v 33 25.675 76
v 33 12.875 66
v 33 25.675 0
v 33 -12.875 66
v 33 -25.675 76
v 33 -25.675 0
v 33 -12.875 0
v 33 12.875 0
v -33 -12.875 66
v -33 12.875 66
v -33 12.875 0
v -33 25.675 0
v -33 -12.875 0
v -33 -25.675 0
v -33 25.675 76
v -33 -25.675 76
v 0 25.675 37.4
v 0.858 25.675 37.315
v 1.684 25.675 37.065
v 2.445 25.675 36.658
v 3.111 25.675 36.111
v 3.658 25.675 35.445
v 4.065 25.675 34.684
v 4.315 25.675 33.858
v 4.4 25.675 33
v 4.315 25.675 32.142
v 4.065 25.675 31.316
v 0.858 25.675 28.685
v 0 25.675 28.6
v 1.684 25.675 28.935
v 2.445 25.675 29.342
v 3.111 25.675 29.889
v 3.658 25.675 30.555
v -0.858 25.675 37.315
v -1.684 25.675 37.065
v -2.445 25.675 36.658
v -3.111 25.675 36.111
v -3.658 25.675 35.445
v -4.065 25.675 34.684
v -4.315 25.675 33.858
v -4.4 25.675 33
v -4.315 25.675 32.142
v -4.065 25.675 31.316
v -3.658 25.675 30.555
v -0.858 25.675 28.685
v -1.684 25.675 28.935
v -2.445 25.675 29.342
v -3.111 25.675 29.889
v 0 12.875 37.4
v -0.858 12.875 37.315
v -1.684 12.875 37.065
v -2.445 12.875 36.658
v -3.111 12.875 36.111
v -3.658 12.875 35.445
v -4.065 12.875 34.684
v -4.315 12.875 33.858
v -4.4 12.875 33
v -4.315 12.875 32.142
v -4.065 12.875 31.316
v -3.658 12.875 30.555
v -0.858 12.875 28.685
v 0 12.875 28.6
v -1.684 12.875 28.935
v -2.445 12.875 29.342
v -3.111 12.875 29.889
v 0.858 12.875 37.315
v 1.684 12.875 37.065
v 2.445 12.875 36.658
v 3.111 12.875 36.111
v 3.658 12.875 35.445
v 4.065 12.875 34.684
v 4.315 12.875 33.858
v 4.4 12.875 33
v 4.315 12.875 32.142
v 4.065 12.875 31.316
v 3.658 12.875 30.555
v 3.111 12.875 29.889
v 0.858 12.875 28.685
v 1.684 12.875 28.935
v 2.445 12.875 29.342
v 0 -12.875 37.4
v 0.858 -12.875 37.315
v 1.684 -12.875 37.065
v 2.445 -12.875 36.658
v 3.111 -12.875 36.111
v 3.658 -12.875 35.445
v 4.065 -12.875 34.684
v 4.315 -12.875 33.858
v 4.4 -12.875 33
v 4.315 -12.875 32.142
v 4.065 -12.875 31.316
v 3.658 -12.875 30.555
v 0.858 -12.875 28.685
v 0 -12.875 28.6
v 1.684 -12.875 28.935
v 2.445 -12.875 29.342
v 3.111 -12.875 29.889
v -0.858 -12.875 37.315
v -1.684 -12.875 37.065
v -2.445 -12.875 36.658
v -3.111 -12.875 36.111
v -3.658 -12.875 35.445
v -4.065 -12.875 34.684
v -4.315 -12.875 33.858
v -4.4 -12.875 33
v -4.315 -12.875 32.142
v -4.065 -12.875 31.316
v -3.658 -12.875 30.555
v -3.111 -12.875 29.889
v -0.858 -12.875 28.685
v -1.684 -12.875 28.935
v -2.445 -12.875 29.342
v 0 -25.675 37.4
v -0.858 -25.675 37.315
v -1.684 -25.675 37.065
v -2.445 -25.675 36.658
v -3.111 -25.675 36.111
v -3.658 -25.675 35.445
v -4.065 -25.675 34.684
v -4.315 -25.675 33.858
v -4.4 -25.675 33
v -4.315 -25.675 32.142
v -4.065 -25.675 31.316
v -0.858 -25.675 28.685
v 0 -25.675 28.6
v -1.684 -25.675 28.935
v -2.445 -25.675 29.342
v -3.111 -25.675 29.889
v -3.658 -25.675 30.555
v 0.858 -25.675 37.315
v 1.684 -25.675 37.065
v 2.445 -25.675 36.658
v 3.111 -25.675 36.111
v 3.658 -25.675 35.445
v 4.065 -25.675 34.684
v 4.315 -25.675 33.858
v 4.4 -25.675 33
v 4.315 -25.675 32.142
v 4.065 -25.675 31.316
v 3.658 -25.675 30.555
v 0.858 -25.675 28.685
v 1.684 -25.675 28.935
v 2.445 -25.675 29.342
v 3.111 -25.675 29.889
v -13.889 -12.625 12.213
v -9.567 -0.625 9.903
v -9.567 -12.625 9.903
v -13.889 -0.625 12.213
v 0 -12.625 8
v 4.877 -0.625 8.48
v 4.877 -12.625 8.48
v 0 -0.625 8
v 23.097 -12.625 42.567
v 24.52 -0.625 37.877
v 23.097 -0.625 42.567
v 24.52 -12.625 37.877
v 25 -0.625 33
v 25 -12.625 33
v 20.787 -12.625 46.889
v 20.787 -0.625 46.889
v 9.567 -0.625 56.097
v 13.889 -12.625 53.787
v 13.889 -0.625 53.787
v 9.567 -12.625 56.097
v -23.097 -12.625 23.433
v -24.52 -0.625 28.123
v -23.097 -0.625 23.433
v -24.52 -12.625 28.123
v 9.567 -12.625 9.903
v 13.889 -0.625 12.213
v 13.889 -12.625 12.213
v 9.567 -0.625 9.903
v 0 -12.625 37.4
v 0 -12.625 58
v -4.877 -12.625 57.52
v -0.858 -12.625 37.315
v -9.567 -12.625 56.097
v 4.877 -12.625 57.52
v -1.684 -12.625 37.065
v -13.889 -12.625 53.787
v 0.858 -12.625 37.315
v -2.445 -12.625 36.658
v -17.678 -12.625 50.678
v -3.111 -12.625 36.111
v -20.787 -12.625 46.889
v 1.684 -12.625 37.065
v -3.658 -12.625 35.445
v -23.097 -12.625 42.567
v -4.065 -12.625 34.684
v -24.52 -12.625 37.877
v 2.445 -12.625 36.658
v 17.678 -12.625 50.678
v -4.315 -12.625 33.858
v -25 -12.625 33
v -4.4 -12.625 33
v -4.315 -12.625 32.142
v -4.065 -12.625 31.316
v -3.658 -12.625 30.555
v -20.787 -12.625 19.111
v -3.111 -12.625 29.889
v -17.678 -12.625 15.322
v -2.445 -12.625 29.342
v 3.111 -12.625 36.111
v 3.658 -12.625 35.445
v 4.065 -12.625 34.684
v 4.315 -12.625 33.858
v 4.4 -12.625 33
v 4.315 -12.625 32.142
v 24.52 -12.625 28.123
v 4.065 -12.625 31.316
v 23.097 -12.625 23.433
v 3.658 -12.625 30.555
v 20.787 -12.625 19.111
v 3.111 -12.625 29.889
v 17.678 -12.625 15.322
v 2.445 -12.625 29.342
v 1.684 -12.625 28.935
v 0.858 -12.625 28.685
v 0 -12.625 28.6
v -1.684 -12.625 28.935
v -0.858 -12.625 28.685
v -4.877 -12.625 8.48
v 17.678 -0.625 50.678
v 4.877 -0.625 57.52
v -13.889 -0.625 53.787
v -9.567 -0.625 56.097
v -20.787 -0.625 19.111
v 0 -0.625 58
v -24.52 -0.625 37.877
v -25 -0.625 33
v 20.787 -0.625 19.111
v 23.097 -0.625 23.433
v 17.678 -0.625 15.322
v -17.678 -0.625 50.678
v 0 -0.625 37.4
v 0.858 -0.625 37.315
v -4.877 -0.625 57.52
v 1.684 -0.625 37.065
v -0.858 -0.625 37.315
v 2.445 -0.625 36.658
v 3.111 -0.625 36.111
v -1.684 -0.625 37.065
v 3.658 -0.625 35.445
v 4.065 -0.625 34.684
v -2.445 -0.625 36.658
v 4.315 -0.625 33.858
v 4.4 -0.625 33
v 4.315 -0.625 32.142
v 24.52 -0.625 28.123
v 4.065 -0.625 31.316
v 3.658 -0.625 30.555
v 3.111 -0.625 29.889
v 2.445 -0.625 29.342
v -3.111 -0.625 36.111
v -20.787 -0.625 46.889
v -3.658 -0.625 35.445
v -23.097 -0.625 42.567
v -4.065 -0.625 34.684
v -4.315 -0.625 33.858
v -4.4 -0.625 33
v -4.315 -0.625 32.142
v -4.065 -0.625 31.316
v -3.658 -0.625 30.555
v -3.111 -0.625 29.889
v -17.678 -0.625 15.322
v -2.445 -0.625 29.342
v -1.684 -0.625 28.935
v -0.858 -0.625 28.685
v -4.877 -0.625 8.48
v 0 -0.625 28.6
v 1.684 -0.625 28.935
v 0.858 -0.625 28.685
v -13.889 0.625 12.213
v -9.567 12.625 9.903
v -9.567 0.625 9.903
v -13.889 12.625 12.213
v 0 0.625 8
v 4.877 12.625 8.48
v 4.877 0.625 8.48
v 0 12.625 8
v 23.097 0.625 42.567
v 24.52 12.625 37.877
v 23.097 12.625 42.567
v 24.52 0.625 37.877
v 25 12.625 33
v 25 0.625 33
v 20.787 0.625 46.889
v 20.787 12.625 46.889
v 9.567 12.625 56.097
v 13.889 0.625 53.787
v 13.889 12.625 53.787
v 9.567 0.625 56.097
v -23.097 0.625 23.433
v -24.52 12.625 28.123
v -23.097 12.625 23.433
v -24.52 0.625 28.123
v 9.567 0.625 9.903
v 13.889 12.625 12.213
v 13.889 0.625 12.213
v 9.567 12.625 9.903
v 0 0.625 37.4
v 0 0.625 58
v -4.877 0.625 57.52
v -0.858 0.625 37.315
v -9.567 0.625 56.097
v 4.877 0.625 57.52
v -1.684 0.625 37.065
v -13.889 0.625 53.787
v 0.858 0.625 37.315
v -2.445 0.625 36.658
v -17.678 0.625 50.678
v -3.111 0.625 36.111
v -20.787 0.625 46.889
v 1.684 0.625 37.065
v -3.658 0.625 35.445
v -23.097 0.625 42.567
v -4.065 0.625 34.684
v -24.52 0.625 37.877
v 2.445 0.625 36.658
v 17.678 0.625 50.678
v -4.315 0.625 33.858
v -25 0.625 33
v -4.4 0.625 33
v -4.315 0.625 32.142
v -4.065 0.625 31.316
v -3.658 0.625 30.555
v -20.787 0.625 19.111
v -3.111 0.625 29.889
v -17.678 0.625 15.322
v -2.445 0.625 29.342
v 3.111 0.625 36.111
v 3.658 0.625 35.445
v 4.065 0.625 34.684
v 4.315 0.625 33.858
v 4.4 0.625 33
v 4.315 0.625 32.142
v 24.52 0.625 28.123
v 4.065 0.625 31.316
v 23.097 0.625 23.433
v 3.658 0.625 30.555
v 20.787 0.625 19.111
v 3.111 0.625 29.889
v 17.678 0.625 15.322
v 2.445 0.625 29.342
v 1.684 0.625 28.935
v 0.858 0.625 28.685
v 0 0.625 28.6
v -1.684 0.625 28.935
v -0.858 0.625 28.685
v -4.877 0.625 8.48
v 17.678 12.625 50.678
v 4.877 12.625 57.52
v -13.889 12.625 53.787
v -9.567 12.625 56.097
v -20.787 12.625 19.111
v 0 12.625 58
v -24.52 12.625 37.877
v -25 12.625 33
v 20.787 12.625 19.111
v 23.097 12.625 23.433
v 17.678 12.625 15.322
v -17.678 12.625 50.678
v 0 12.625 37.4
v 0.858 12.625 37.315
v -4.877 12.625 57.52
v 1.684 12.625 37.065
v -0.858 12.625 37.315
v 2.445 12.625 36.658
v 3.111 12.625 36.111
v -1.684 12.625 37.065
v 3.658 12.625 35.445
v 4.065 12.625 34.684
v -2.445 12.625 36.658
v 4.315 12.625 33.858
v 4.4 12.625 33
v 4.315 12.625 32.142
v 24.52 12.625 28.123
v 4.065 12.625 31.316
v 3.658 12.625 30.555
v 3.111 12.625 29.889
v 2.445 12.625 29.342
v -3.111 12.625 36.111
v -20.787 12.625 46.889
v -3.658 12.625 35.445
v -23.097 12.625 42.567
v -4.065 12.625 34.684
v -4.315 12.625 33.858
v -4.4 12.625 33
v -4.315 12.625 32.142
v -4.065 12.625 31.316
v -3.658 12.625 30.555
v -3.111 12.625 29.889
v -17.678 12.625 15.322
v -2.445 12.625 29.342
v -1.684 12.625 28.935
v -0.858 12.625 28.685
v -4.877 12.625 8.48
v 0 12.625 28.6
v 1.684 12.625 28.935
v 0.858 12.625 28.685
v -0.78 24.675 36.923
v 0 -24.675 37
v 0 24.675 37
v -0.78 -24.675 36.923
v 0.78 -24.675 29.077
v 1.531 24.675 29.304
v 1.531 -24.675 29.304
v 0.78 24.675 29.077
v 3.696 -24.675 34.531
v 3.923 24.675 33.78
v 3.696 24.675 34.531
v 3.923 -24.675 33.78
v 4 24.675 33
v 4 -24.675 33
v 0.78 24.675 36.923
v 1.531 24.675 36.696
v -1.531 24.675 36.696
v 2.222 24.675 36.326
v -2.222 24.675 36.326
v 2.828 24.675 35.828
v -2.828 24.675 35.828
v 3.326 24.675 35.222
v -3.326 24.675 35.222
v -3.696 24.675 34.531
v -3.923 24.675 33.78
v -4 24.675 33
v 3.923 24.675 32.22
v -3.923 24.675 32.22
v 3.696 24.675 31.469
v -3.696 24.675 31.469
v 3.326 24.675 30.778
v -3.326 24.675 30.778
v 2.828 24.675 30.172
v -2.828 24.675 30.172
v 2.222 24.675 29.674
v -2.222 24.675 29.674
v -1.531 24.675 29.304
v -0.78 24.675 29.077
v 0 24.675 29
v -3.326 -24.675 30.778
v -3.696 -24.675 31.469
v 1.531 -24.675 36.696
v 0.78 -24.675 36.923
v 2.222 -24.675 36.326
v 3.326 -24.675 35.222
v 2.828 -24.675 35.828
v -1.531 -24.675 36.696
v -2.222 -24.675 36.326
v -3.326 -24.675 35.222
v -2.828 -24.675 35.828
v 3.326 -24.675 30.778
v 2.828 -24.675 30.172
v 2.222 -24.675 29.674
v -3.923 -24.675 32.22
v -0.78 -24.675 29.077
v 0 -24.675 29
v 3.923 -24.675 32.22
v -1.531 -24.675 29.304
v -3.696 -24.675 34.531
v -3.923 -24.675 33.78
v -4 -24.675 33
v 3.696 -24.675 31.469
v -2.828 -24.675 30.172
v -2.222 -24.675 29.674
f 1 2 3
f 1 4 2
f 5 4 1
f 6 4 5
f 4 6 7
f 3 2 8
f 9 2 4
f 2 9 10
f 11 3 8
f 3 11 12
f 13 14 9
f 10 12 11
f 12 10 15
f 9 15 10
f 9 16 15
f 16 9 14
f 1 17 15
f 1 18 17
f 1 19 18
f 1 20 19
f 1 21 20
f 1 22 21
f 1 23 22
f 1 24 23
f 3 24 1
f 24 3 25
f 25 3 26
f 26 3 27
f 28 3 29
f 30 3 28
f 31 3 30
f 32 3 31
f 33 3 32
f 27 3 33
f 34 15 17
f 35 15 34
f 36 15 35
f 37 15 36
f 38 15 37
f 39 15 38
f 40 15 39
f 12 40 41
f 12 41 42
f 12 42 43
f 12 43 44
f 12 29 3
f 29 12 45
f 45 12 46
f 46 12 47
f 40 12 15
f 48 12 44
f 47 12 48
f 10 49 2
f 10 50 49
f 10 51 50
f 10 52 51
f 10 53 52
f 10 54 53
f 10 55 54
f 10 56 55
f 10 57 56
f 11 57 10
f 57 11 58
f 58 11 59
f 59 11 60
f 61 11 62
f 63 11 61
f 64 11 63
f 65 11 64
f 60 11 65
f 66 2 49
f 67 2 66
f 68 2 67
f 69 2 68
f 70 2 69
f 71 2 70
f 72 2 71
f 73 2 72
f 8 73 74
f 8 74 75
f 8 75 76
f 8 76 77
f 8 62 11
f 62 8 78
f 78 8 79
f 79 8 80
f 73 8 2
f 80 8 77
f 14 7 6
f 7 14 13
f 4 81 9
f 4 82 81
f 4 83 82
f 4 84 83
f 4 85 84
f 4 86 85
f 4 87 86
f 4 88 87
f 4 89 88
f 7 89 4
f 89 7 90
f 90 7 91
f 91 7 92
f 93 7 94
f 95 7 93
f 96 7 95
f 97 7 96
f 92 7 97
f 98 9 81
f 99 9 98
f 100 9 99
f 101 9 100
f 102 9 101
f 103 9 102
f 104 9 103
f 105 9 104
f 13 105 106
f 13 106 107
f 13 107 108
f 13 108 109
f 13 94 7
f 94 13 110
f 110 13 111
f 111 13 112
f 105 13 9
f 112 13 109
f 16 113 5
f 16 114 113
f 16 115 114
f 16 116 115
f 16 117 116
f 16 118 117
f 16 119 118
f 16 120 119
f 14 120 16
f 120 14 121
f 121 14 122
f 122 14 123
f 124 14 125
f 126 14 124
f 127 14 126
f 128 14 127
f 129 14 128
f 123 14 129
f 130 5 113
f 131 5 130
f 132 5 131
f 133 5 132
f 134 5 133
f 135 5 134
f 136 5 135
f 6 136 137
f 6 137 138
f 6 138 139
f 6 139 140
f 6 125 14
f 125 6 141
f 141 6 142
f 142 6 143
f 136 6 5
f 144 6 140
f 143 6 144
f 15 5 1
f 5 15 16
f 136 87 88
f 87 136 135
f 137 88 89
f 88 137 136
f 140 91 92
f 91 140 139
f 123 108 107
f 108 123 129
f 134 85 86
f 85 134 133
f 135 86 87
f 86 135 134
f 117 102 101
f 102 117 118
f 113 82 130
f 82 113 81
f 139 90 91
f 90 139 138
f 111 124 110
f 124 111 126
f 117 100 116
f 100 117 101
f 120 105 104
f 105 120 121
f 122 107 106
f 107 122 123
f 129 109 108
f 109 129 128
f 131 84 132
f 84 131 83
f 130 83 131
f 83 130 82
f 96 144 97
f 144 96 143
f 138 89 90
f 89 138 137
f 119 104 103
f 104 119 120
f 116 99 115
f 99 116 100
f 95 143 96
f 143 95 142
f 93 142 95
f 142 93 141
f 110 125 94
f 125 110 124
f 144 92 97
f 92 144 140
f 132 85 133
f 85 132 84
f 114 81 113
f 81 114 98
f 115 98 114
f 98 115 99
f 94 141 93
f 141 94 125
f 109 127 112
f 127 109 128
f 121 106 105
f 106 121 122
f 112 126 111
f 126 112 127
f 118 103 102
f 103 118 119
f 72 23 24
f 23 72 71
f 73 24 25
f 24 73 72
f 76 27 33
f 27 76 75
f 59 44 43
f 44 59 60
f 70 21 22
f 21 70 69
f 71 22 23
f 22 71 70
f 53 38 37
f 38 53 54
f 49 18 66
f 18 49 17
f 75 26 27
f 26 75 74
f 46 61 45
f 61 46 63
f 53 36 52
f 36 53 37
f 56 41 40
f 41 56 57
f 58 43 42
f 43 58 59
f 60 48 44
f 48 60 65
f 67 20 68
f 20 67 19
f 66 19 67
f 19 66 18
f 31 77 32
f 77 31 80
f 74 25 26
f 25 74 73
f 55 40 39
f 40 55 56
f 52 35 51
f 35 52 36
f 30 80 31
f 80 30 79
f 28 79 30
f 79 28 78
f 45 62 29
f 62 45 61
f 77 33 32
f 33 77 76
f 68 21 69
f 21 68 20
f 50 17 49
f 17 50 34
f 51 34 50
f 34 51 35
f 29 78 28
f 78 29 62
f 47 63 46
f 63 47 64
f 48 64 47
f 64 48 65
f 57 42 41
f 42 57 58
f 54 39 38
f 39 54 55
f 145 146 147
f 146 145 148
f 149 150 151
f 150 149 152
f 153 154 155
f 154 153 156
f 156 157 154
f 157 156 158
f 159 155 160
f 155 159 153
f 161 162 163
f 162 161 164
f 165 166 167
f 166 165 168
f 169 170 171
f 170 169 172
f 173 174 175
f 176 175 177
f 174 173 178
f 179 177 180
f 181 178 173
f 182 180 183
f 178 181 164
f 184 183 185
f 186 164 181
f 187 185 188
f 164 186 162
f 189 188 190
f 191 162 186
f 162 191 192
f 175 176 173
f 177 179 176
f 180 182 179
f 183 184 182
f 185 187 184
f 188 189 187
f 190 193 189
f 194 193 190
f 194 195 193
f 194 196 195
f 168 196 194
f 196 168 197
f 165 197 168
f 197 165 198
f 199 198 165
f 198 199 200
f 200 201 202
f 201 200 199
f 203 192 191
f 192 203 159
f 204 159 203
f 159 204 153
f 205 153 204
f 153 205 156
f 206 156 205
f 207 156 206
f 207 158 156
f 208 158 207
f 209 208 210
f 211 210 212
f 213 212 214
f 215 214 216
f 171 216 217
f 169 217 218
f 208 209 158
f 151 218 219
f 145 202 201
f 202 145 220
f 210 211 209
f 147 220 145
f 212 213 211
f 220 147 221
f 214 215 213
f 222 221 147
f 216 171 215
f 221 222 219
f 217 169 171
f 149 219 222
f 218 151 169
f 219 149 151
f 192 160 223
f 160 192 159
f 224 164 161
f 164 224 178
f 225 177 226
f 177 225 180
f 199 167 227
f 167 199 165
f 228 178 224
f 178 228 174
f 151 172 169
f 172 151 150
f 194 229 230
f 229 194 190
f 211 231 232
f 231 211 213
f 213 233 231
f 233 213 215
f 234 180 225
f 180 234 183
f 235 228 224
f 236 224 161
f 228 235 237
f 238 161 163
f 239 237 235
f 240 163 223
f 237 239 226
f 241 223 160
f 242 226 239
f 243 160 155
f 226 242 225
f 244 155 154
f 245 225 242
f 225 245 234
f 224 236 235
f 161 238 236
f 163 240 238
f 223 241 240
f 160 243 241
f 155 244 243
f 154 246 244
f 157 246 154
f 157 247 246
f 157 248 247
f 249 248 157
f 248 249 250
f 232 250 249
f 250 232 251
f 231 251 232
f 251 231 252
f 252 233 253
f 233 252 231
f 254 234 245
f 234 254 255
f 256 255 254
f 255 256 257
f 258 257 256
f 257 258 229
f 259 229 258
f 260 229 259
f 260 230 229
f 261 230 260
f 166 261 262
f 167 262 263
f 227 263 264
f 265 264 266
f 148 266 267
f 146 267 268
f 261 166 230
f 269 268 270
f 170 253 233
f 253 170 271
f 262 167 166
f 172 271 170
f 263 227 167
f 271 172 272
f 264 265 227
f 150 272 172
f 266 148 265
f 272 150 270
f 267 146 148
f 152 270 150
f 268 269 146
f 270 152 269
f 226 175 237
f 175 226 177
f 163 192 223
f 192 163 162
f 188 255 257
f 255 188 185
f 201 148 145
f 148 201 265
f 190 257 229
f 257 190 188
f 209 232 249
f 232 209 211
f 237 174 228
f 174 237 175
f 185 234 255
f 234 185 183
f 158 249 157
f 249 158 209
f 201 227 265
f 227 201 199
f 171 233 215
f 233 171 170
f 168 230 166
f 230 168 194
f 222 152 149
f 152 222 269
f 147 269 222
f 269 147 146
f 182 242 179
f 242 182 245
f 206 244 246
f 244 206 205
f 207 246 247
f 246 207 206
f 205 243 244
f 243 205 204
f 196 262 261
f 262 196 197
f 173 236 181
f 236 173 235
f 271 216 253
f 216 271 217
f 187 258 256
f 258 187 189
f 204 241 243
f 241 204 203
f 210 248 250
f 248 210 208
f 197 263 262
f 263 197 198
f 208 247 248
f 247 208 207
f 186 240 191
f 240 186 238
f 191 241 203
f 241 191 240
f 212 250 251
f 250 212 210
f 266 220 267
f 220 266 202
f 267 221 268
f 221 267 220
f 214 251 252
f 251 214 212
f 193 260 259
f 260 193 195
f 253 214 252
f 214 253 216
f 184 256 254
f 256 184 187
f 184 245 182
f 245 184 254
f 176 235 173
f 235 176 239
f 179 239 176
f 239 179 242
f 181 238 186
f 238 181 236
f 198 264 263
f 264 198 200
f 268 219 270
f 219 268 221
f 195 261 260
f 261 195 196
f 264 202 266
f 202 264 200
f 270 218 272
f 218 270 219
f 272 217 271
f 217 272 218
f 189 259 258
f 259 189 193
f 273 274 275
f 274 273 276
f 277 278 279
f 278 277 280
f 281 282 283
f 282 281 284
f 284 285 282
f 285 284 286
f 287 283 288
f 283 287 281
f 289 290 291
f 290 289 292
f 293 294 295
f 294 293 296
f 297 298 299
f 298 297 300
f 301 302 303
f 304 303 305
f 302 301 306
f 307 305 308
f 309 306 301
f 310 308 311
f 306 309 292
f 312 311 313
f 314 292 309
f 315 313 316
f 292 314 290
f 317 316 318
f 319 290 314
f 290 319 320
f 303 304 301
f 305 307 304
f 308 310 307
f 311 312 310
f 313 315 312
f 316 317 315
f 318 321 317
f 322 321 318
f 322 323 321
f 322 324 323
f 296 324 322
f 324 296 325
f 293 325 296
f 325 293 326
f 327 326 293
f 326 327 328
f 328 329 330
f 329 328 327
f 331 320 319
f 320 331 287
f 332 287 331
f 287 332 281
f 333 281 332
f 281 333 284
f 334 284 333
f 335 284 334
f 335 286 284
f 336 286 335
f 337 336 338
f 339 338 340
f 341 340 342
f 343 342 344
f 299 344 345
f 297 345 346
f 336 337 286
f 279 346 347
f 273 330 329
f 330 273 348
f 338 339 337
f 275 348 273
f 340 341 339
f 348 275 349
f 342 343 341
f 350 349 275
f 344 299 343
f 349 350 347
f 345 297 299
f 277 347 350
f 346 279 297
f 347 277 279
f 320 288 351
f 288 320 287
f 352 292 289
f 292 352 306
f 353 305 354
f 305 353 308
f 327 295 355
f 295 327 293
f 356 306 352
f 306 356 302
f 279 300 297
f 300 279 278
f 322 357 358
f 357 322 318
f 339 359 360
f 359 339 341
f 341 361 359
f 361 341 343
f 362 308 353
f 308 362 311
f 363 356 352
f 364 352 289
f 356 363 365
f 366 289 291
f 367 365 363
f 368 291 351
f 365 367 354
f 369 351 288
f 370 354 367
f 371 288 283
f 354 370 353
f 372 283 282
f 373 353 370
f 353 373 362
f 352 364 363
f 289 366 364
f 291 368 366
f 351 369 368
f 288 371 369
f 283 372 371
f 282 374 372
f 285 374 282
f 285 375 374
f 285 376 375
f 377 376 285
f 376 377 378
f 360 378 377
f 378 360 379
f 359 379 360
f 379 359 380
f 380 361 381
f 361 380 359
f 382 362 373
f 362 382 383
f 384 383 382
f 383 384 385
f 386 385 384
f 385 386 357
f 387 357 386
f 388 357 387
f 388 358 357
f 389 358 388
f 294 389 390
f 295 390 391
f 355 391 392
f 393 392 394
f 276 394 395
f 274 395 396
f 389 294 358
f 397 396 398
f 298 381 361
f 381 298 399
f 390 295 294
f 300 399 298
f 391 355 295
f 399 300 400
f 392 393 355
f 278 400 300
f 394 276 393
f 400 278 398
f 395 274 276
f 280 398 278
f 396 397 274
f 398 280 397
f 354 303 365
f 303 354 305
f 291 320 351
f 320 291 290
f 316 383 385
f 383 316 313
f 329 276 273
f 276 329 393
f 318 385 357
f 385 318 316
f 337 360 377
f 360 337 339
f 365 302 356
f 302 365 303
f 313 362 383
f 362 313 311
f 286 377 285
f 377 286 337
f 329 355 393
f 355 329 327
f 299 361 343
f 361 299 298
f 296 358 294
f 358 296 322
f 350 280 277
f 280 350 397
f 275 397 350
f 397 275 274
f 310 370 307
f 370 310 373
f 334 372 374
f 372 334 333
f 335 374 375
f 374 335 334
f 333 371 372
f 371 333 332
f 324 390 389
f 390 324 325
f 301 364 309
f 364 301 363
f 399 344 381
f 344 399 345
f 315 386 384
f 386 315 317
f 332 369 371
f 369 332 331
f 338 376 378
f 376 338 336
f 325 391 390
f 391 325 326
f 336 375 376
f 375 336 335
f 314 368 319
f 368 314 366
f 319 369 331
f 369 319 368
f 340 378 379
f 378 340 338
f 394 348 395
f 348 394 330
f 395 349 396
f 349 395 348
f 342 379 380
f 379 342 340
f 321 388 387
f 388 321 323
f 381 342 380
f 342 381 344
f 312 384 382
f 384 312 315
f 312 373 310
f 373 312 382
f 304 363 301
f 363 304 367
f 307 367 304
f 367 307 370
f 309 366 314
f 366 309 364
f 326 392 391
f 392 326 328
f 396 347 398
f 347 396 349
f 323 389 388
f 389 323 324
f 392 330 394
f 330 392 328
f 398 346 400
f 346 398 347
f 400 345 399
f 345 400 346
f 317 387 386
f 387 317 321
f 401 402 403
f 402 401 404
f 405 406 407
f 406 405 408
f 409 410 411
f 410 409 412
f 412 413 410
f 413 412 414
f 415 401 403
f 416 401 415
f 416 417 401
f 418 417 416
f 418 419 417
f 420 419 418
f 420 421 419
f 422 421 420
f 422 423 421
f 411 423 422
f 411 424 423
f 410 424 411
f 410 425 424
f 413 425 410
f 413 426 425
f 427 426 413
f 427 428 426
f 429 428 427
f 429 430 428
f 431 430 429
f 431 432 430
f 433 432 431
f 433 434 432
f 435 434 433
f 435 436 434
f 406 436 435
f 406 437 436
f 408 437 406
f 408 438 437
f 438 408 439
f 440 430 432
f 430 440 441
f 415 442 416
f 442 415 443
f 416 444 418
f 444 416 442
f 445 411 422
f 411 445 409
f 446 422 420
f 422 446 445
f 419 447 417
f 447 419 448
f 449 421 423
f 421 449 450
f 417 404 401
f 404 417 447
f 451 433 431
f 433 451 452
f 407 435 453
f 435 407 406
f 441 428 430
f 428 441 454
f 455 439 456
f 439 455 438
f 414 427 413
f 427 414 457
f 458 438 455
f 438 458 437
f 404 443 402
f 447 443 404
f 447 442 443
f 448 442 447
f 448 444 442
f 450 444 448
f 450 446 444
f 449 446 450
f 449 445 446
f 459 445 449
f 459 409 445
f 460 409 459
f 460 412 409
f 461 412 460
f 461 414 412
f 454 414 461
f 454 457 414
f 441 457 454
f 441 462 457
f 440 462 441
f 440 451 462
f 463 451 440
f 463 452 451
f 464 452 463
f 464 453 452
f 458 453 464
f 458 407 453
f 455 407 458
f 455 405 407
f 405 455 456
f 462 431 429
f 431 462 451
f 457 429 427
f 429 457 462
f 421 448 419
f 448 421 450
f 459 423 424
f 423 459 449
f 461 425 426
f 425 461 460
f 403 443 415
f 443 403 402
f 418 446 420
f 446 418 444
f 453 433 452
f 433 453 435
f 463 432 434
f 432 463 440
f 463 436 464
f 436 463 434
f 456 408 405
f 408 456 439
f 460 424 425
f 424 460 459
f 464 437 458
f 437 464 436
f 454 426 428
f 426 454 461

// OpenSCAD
$fn = 32;

// ------------------------------------------------------------------------
// Trolley wheel set: wheels d50, fork 66 mm tall
// Every part is its own module, assembly() places every instance.
// ------------------------------------------------------------------------

// --- part 1 ---
module trolley_fork() {
  difference() {
    union() {
      translate([-33, 12.875, 0]) cube([66, 12.8, 66]);
      translate([-33, -25.675, 0]) cube([66, 12.8, 66]);
      translate([-33, -25.675, 66]) cube([66, 51.35, 10]);
    }
    translate([0, -19.275, 33]) rotate([90, 0, 0]) cylinder(h = 14.8, d = 8.8, center = true);
    translate([0, 19.275, 33]) rotate([90, 0, 0]) cylinder(h = 14.8, d = 8.8, center = true);
  }
}

// --- part 2 ---
module trolley_wheel() {
  difference() {
      translate([0, 0, 0]) cylinder(h = 12, d = 50);
      translate([0, 0, -1]) cylinder(h = 14, d = 8.8);
    }
}

// --- part 3 ---
module trolley_axle() {
  translate([0, 0, -24.675]) cylinder(h = 49.35, d = 8);
}

// --- assembly ---
module assembly() {
  color([0.80, 0.24, 0.20]) translate([0, 0, 0]) rotate([0, 0, 0]) trolley_fork();
  color([0.20, 0.45, 0.75]) translate([0, -0.625, 33]) rotate([90, 0, 0]) trolley_wheel();
  color([0.25, 0.62, 0.32]) translate([0, 12.625, 33]) rotate([90, 0, 0]) trolley_wheel();
  color([0.92, 0.70, 0.18]) translate([0, 0, 33]) rotate([90, 0, 0]) trolley_axle();
}

assembly();
